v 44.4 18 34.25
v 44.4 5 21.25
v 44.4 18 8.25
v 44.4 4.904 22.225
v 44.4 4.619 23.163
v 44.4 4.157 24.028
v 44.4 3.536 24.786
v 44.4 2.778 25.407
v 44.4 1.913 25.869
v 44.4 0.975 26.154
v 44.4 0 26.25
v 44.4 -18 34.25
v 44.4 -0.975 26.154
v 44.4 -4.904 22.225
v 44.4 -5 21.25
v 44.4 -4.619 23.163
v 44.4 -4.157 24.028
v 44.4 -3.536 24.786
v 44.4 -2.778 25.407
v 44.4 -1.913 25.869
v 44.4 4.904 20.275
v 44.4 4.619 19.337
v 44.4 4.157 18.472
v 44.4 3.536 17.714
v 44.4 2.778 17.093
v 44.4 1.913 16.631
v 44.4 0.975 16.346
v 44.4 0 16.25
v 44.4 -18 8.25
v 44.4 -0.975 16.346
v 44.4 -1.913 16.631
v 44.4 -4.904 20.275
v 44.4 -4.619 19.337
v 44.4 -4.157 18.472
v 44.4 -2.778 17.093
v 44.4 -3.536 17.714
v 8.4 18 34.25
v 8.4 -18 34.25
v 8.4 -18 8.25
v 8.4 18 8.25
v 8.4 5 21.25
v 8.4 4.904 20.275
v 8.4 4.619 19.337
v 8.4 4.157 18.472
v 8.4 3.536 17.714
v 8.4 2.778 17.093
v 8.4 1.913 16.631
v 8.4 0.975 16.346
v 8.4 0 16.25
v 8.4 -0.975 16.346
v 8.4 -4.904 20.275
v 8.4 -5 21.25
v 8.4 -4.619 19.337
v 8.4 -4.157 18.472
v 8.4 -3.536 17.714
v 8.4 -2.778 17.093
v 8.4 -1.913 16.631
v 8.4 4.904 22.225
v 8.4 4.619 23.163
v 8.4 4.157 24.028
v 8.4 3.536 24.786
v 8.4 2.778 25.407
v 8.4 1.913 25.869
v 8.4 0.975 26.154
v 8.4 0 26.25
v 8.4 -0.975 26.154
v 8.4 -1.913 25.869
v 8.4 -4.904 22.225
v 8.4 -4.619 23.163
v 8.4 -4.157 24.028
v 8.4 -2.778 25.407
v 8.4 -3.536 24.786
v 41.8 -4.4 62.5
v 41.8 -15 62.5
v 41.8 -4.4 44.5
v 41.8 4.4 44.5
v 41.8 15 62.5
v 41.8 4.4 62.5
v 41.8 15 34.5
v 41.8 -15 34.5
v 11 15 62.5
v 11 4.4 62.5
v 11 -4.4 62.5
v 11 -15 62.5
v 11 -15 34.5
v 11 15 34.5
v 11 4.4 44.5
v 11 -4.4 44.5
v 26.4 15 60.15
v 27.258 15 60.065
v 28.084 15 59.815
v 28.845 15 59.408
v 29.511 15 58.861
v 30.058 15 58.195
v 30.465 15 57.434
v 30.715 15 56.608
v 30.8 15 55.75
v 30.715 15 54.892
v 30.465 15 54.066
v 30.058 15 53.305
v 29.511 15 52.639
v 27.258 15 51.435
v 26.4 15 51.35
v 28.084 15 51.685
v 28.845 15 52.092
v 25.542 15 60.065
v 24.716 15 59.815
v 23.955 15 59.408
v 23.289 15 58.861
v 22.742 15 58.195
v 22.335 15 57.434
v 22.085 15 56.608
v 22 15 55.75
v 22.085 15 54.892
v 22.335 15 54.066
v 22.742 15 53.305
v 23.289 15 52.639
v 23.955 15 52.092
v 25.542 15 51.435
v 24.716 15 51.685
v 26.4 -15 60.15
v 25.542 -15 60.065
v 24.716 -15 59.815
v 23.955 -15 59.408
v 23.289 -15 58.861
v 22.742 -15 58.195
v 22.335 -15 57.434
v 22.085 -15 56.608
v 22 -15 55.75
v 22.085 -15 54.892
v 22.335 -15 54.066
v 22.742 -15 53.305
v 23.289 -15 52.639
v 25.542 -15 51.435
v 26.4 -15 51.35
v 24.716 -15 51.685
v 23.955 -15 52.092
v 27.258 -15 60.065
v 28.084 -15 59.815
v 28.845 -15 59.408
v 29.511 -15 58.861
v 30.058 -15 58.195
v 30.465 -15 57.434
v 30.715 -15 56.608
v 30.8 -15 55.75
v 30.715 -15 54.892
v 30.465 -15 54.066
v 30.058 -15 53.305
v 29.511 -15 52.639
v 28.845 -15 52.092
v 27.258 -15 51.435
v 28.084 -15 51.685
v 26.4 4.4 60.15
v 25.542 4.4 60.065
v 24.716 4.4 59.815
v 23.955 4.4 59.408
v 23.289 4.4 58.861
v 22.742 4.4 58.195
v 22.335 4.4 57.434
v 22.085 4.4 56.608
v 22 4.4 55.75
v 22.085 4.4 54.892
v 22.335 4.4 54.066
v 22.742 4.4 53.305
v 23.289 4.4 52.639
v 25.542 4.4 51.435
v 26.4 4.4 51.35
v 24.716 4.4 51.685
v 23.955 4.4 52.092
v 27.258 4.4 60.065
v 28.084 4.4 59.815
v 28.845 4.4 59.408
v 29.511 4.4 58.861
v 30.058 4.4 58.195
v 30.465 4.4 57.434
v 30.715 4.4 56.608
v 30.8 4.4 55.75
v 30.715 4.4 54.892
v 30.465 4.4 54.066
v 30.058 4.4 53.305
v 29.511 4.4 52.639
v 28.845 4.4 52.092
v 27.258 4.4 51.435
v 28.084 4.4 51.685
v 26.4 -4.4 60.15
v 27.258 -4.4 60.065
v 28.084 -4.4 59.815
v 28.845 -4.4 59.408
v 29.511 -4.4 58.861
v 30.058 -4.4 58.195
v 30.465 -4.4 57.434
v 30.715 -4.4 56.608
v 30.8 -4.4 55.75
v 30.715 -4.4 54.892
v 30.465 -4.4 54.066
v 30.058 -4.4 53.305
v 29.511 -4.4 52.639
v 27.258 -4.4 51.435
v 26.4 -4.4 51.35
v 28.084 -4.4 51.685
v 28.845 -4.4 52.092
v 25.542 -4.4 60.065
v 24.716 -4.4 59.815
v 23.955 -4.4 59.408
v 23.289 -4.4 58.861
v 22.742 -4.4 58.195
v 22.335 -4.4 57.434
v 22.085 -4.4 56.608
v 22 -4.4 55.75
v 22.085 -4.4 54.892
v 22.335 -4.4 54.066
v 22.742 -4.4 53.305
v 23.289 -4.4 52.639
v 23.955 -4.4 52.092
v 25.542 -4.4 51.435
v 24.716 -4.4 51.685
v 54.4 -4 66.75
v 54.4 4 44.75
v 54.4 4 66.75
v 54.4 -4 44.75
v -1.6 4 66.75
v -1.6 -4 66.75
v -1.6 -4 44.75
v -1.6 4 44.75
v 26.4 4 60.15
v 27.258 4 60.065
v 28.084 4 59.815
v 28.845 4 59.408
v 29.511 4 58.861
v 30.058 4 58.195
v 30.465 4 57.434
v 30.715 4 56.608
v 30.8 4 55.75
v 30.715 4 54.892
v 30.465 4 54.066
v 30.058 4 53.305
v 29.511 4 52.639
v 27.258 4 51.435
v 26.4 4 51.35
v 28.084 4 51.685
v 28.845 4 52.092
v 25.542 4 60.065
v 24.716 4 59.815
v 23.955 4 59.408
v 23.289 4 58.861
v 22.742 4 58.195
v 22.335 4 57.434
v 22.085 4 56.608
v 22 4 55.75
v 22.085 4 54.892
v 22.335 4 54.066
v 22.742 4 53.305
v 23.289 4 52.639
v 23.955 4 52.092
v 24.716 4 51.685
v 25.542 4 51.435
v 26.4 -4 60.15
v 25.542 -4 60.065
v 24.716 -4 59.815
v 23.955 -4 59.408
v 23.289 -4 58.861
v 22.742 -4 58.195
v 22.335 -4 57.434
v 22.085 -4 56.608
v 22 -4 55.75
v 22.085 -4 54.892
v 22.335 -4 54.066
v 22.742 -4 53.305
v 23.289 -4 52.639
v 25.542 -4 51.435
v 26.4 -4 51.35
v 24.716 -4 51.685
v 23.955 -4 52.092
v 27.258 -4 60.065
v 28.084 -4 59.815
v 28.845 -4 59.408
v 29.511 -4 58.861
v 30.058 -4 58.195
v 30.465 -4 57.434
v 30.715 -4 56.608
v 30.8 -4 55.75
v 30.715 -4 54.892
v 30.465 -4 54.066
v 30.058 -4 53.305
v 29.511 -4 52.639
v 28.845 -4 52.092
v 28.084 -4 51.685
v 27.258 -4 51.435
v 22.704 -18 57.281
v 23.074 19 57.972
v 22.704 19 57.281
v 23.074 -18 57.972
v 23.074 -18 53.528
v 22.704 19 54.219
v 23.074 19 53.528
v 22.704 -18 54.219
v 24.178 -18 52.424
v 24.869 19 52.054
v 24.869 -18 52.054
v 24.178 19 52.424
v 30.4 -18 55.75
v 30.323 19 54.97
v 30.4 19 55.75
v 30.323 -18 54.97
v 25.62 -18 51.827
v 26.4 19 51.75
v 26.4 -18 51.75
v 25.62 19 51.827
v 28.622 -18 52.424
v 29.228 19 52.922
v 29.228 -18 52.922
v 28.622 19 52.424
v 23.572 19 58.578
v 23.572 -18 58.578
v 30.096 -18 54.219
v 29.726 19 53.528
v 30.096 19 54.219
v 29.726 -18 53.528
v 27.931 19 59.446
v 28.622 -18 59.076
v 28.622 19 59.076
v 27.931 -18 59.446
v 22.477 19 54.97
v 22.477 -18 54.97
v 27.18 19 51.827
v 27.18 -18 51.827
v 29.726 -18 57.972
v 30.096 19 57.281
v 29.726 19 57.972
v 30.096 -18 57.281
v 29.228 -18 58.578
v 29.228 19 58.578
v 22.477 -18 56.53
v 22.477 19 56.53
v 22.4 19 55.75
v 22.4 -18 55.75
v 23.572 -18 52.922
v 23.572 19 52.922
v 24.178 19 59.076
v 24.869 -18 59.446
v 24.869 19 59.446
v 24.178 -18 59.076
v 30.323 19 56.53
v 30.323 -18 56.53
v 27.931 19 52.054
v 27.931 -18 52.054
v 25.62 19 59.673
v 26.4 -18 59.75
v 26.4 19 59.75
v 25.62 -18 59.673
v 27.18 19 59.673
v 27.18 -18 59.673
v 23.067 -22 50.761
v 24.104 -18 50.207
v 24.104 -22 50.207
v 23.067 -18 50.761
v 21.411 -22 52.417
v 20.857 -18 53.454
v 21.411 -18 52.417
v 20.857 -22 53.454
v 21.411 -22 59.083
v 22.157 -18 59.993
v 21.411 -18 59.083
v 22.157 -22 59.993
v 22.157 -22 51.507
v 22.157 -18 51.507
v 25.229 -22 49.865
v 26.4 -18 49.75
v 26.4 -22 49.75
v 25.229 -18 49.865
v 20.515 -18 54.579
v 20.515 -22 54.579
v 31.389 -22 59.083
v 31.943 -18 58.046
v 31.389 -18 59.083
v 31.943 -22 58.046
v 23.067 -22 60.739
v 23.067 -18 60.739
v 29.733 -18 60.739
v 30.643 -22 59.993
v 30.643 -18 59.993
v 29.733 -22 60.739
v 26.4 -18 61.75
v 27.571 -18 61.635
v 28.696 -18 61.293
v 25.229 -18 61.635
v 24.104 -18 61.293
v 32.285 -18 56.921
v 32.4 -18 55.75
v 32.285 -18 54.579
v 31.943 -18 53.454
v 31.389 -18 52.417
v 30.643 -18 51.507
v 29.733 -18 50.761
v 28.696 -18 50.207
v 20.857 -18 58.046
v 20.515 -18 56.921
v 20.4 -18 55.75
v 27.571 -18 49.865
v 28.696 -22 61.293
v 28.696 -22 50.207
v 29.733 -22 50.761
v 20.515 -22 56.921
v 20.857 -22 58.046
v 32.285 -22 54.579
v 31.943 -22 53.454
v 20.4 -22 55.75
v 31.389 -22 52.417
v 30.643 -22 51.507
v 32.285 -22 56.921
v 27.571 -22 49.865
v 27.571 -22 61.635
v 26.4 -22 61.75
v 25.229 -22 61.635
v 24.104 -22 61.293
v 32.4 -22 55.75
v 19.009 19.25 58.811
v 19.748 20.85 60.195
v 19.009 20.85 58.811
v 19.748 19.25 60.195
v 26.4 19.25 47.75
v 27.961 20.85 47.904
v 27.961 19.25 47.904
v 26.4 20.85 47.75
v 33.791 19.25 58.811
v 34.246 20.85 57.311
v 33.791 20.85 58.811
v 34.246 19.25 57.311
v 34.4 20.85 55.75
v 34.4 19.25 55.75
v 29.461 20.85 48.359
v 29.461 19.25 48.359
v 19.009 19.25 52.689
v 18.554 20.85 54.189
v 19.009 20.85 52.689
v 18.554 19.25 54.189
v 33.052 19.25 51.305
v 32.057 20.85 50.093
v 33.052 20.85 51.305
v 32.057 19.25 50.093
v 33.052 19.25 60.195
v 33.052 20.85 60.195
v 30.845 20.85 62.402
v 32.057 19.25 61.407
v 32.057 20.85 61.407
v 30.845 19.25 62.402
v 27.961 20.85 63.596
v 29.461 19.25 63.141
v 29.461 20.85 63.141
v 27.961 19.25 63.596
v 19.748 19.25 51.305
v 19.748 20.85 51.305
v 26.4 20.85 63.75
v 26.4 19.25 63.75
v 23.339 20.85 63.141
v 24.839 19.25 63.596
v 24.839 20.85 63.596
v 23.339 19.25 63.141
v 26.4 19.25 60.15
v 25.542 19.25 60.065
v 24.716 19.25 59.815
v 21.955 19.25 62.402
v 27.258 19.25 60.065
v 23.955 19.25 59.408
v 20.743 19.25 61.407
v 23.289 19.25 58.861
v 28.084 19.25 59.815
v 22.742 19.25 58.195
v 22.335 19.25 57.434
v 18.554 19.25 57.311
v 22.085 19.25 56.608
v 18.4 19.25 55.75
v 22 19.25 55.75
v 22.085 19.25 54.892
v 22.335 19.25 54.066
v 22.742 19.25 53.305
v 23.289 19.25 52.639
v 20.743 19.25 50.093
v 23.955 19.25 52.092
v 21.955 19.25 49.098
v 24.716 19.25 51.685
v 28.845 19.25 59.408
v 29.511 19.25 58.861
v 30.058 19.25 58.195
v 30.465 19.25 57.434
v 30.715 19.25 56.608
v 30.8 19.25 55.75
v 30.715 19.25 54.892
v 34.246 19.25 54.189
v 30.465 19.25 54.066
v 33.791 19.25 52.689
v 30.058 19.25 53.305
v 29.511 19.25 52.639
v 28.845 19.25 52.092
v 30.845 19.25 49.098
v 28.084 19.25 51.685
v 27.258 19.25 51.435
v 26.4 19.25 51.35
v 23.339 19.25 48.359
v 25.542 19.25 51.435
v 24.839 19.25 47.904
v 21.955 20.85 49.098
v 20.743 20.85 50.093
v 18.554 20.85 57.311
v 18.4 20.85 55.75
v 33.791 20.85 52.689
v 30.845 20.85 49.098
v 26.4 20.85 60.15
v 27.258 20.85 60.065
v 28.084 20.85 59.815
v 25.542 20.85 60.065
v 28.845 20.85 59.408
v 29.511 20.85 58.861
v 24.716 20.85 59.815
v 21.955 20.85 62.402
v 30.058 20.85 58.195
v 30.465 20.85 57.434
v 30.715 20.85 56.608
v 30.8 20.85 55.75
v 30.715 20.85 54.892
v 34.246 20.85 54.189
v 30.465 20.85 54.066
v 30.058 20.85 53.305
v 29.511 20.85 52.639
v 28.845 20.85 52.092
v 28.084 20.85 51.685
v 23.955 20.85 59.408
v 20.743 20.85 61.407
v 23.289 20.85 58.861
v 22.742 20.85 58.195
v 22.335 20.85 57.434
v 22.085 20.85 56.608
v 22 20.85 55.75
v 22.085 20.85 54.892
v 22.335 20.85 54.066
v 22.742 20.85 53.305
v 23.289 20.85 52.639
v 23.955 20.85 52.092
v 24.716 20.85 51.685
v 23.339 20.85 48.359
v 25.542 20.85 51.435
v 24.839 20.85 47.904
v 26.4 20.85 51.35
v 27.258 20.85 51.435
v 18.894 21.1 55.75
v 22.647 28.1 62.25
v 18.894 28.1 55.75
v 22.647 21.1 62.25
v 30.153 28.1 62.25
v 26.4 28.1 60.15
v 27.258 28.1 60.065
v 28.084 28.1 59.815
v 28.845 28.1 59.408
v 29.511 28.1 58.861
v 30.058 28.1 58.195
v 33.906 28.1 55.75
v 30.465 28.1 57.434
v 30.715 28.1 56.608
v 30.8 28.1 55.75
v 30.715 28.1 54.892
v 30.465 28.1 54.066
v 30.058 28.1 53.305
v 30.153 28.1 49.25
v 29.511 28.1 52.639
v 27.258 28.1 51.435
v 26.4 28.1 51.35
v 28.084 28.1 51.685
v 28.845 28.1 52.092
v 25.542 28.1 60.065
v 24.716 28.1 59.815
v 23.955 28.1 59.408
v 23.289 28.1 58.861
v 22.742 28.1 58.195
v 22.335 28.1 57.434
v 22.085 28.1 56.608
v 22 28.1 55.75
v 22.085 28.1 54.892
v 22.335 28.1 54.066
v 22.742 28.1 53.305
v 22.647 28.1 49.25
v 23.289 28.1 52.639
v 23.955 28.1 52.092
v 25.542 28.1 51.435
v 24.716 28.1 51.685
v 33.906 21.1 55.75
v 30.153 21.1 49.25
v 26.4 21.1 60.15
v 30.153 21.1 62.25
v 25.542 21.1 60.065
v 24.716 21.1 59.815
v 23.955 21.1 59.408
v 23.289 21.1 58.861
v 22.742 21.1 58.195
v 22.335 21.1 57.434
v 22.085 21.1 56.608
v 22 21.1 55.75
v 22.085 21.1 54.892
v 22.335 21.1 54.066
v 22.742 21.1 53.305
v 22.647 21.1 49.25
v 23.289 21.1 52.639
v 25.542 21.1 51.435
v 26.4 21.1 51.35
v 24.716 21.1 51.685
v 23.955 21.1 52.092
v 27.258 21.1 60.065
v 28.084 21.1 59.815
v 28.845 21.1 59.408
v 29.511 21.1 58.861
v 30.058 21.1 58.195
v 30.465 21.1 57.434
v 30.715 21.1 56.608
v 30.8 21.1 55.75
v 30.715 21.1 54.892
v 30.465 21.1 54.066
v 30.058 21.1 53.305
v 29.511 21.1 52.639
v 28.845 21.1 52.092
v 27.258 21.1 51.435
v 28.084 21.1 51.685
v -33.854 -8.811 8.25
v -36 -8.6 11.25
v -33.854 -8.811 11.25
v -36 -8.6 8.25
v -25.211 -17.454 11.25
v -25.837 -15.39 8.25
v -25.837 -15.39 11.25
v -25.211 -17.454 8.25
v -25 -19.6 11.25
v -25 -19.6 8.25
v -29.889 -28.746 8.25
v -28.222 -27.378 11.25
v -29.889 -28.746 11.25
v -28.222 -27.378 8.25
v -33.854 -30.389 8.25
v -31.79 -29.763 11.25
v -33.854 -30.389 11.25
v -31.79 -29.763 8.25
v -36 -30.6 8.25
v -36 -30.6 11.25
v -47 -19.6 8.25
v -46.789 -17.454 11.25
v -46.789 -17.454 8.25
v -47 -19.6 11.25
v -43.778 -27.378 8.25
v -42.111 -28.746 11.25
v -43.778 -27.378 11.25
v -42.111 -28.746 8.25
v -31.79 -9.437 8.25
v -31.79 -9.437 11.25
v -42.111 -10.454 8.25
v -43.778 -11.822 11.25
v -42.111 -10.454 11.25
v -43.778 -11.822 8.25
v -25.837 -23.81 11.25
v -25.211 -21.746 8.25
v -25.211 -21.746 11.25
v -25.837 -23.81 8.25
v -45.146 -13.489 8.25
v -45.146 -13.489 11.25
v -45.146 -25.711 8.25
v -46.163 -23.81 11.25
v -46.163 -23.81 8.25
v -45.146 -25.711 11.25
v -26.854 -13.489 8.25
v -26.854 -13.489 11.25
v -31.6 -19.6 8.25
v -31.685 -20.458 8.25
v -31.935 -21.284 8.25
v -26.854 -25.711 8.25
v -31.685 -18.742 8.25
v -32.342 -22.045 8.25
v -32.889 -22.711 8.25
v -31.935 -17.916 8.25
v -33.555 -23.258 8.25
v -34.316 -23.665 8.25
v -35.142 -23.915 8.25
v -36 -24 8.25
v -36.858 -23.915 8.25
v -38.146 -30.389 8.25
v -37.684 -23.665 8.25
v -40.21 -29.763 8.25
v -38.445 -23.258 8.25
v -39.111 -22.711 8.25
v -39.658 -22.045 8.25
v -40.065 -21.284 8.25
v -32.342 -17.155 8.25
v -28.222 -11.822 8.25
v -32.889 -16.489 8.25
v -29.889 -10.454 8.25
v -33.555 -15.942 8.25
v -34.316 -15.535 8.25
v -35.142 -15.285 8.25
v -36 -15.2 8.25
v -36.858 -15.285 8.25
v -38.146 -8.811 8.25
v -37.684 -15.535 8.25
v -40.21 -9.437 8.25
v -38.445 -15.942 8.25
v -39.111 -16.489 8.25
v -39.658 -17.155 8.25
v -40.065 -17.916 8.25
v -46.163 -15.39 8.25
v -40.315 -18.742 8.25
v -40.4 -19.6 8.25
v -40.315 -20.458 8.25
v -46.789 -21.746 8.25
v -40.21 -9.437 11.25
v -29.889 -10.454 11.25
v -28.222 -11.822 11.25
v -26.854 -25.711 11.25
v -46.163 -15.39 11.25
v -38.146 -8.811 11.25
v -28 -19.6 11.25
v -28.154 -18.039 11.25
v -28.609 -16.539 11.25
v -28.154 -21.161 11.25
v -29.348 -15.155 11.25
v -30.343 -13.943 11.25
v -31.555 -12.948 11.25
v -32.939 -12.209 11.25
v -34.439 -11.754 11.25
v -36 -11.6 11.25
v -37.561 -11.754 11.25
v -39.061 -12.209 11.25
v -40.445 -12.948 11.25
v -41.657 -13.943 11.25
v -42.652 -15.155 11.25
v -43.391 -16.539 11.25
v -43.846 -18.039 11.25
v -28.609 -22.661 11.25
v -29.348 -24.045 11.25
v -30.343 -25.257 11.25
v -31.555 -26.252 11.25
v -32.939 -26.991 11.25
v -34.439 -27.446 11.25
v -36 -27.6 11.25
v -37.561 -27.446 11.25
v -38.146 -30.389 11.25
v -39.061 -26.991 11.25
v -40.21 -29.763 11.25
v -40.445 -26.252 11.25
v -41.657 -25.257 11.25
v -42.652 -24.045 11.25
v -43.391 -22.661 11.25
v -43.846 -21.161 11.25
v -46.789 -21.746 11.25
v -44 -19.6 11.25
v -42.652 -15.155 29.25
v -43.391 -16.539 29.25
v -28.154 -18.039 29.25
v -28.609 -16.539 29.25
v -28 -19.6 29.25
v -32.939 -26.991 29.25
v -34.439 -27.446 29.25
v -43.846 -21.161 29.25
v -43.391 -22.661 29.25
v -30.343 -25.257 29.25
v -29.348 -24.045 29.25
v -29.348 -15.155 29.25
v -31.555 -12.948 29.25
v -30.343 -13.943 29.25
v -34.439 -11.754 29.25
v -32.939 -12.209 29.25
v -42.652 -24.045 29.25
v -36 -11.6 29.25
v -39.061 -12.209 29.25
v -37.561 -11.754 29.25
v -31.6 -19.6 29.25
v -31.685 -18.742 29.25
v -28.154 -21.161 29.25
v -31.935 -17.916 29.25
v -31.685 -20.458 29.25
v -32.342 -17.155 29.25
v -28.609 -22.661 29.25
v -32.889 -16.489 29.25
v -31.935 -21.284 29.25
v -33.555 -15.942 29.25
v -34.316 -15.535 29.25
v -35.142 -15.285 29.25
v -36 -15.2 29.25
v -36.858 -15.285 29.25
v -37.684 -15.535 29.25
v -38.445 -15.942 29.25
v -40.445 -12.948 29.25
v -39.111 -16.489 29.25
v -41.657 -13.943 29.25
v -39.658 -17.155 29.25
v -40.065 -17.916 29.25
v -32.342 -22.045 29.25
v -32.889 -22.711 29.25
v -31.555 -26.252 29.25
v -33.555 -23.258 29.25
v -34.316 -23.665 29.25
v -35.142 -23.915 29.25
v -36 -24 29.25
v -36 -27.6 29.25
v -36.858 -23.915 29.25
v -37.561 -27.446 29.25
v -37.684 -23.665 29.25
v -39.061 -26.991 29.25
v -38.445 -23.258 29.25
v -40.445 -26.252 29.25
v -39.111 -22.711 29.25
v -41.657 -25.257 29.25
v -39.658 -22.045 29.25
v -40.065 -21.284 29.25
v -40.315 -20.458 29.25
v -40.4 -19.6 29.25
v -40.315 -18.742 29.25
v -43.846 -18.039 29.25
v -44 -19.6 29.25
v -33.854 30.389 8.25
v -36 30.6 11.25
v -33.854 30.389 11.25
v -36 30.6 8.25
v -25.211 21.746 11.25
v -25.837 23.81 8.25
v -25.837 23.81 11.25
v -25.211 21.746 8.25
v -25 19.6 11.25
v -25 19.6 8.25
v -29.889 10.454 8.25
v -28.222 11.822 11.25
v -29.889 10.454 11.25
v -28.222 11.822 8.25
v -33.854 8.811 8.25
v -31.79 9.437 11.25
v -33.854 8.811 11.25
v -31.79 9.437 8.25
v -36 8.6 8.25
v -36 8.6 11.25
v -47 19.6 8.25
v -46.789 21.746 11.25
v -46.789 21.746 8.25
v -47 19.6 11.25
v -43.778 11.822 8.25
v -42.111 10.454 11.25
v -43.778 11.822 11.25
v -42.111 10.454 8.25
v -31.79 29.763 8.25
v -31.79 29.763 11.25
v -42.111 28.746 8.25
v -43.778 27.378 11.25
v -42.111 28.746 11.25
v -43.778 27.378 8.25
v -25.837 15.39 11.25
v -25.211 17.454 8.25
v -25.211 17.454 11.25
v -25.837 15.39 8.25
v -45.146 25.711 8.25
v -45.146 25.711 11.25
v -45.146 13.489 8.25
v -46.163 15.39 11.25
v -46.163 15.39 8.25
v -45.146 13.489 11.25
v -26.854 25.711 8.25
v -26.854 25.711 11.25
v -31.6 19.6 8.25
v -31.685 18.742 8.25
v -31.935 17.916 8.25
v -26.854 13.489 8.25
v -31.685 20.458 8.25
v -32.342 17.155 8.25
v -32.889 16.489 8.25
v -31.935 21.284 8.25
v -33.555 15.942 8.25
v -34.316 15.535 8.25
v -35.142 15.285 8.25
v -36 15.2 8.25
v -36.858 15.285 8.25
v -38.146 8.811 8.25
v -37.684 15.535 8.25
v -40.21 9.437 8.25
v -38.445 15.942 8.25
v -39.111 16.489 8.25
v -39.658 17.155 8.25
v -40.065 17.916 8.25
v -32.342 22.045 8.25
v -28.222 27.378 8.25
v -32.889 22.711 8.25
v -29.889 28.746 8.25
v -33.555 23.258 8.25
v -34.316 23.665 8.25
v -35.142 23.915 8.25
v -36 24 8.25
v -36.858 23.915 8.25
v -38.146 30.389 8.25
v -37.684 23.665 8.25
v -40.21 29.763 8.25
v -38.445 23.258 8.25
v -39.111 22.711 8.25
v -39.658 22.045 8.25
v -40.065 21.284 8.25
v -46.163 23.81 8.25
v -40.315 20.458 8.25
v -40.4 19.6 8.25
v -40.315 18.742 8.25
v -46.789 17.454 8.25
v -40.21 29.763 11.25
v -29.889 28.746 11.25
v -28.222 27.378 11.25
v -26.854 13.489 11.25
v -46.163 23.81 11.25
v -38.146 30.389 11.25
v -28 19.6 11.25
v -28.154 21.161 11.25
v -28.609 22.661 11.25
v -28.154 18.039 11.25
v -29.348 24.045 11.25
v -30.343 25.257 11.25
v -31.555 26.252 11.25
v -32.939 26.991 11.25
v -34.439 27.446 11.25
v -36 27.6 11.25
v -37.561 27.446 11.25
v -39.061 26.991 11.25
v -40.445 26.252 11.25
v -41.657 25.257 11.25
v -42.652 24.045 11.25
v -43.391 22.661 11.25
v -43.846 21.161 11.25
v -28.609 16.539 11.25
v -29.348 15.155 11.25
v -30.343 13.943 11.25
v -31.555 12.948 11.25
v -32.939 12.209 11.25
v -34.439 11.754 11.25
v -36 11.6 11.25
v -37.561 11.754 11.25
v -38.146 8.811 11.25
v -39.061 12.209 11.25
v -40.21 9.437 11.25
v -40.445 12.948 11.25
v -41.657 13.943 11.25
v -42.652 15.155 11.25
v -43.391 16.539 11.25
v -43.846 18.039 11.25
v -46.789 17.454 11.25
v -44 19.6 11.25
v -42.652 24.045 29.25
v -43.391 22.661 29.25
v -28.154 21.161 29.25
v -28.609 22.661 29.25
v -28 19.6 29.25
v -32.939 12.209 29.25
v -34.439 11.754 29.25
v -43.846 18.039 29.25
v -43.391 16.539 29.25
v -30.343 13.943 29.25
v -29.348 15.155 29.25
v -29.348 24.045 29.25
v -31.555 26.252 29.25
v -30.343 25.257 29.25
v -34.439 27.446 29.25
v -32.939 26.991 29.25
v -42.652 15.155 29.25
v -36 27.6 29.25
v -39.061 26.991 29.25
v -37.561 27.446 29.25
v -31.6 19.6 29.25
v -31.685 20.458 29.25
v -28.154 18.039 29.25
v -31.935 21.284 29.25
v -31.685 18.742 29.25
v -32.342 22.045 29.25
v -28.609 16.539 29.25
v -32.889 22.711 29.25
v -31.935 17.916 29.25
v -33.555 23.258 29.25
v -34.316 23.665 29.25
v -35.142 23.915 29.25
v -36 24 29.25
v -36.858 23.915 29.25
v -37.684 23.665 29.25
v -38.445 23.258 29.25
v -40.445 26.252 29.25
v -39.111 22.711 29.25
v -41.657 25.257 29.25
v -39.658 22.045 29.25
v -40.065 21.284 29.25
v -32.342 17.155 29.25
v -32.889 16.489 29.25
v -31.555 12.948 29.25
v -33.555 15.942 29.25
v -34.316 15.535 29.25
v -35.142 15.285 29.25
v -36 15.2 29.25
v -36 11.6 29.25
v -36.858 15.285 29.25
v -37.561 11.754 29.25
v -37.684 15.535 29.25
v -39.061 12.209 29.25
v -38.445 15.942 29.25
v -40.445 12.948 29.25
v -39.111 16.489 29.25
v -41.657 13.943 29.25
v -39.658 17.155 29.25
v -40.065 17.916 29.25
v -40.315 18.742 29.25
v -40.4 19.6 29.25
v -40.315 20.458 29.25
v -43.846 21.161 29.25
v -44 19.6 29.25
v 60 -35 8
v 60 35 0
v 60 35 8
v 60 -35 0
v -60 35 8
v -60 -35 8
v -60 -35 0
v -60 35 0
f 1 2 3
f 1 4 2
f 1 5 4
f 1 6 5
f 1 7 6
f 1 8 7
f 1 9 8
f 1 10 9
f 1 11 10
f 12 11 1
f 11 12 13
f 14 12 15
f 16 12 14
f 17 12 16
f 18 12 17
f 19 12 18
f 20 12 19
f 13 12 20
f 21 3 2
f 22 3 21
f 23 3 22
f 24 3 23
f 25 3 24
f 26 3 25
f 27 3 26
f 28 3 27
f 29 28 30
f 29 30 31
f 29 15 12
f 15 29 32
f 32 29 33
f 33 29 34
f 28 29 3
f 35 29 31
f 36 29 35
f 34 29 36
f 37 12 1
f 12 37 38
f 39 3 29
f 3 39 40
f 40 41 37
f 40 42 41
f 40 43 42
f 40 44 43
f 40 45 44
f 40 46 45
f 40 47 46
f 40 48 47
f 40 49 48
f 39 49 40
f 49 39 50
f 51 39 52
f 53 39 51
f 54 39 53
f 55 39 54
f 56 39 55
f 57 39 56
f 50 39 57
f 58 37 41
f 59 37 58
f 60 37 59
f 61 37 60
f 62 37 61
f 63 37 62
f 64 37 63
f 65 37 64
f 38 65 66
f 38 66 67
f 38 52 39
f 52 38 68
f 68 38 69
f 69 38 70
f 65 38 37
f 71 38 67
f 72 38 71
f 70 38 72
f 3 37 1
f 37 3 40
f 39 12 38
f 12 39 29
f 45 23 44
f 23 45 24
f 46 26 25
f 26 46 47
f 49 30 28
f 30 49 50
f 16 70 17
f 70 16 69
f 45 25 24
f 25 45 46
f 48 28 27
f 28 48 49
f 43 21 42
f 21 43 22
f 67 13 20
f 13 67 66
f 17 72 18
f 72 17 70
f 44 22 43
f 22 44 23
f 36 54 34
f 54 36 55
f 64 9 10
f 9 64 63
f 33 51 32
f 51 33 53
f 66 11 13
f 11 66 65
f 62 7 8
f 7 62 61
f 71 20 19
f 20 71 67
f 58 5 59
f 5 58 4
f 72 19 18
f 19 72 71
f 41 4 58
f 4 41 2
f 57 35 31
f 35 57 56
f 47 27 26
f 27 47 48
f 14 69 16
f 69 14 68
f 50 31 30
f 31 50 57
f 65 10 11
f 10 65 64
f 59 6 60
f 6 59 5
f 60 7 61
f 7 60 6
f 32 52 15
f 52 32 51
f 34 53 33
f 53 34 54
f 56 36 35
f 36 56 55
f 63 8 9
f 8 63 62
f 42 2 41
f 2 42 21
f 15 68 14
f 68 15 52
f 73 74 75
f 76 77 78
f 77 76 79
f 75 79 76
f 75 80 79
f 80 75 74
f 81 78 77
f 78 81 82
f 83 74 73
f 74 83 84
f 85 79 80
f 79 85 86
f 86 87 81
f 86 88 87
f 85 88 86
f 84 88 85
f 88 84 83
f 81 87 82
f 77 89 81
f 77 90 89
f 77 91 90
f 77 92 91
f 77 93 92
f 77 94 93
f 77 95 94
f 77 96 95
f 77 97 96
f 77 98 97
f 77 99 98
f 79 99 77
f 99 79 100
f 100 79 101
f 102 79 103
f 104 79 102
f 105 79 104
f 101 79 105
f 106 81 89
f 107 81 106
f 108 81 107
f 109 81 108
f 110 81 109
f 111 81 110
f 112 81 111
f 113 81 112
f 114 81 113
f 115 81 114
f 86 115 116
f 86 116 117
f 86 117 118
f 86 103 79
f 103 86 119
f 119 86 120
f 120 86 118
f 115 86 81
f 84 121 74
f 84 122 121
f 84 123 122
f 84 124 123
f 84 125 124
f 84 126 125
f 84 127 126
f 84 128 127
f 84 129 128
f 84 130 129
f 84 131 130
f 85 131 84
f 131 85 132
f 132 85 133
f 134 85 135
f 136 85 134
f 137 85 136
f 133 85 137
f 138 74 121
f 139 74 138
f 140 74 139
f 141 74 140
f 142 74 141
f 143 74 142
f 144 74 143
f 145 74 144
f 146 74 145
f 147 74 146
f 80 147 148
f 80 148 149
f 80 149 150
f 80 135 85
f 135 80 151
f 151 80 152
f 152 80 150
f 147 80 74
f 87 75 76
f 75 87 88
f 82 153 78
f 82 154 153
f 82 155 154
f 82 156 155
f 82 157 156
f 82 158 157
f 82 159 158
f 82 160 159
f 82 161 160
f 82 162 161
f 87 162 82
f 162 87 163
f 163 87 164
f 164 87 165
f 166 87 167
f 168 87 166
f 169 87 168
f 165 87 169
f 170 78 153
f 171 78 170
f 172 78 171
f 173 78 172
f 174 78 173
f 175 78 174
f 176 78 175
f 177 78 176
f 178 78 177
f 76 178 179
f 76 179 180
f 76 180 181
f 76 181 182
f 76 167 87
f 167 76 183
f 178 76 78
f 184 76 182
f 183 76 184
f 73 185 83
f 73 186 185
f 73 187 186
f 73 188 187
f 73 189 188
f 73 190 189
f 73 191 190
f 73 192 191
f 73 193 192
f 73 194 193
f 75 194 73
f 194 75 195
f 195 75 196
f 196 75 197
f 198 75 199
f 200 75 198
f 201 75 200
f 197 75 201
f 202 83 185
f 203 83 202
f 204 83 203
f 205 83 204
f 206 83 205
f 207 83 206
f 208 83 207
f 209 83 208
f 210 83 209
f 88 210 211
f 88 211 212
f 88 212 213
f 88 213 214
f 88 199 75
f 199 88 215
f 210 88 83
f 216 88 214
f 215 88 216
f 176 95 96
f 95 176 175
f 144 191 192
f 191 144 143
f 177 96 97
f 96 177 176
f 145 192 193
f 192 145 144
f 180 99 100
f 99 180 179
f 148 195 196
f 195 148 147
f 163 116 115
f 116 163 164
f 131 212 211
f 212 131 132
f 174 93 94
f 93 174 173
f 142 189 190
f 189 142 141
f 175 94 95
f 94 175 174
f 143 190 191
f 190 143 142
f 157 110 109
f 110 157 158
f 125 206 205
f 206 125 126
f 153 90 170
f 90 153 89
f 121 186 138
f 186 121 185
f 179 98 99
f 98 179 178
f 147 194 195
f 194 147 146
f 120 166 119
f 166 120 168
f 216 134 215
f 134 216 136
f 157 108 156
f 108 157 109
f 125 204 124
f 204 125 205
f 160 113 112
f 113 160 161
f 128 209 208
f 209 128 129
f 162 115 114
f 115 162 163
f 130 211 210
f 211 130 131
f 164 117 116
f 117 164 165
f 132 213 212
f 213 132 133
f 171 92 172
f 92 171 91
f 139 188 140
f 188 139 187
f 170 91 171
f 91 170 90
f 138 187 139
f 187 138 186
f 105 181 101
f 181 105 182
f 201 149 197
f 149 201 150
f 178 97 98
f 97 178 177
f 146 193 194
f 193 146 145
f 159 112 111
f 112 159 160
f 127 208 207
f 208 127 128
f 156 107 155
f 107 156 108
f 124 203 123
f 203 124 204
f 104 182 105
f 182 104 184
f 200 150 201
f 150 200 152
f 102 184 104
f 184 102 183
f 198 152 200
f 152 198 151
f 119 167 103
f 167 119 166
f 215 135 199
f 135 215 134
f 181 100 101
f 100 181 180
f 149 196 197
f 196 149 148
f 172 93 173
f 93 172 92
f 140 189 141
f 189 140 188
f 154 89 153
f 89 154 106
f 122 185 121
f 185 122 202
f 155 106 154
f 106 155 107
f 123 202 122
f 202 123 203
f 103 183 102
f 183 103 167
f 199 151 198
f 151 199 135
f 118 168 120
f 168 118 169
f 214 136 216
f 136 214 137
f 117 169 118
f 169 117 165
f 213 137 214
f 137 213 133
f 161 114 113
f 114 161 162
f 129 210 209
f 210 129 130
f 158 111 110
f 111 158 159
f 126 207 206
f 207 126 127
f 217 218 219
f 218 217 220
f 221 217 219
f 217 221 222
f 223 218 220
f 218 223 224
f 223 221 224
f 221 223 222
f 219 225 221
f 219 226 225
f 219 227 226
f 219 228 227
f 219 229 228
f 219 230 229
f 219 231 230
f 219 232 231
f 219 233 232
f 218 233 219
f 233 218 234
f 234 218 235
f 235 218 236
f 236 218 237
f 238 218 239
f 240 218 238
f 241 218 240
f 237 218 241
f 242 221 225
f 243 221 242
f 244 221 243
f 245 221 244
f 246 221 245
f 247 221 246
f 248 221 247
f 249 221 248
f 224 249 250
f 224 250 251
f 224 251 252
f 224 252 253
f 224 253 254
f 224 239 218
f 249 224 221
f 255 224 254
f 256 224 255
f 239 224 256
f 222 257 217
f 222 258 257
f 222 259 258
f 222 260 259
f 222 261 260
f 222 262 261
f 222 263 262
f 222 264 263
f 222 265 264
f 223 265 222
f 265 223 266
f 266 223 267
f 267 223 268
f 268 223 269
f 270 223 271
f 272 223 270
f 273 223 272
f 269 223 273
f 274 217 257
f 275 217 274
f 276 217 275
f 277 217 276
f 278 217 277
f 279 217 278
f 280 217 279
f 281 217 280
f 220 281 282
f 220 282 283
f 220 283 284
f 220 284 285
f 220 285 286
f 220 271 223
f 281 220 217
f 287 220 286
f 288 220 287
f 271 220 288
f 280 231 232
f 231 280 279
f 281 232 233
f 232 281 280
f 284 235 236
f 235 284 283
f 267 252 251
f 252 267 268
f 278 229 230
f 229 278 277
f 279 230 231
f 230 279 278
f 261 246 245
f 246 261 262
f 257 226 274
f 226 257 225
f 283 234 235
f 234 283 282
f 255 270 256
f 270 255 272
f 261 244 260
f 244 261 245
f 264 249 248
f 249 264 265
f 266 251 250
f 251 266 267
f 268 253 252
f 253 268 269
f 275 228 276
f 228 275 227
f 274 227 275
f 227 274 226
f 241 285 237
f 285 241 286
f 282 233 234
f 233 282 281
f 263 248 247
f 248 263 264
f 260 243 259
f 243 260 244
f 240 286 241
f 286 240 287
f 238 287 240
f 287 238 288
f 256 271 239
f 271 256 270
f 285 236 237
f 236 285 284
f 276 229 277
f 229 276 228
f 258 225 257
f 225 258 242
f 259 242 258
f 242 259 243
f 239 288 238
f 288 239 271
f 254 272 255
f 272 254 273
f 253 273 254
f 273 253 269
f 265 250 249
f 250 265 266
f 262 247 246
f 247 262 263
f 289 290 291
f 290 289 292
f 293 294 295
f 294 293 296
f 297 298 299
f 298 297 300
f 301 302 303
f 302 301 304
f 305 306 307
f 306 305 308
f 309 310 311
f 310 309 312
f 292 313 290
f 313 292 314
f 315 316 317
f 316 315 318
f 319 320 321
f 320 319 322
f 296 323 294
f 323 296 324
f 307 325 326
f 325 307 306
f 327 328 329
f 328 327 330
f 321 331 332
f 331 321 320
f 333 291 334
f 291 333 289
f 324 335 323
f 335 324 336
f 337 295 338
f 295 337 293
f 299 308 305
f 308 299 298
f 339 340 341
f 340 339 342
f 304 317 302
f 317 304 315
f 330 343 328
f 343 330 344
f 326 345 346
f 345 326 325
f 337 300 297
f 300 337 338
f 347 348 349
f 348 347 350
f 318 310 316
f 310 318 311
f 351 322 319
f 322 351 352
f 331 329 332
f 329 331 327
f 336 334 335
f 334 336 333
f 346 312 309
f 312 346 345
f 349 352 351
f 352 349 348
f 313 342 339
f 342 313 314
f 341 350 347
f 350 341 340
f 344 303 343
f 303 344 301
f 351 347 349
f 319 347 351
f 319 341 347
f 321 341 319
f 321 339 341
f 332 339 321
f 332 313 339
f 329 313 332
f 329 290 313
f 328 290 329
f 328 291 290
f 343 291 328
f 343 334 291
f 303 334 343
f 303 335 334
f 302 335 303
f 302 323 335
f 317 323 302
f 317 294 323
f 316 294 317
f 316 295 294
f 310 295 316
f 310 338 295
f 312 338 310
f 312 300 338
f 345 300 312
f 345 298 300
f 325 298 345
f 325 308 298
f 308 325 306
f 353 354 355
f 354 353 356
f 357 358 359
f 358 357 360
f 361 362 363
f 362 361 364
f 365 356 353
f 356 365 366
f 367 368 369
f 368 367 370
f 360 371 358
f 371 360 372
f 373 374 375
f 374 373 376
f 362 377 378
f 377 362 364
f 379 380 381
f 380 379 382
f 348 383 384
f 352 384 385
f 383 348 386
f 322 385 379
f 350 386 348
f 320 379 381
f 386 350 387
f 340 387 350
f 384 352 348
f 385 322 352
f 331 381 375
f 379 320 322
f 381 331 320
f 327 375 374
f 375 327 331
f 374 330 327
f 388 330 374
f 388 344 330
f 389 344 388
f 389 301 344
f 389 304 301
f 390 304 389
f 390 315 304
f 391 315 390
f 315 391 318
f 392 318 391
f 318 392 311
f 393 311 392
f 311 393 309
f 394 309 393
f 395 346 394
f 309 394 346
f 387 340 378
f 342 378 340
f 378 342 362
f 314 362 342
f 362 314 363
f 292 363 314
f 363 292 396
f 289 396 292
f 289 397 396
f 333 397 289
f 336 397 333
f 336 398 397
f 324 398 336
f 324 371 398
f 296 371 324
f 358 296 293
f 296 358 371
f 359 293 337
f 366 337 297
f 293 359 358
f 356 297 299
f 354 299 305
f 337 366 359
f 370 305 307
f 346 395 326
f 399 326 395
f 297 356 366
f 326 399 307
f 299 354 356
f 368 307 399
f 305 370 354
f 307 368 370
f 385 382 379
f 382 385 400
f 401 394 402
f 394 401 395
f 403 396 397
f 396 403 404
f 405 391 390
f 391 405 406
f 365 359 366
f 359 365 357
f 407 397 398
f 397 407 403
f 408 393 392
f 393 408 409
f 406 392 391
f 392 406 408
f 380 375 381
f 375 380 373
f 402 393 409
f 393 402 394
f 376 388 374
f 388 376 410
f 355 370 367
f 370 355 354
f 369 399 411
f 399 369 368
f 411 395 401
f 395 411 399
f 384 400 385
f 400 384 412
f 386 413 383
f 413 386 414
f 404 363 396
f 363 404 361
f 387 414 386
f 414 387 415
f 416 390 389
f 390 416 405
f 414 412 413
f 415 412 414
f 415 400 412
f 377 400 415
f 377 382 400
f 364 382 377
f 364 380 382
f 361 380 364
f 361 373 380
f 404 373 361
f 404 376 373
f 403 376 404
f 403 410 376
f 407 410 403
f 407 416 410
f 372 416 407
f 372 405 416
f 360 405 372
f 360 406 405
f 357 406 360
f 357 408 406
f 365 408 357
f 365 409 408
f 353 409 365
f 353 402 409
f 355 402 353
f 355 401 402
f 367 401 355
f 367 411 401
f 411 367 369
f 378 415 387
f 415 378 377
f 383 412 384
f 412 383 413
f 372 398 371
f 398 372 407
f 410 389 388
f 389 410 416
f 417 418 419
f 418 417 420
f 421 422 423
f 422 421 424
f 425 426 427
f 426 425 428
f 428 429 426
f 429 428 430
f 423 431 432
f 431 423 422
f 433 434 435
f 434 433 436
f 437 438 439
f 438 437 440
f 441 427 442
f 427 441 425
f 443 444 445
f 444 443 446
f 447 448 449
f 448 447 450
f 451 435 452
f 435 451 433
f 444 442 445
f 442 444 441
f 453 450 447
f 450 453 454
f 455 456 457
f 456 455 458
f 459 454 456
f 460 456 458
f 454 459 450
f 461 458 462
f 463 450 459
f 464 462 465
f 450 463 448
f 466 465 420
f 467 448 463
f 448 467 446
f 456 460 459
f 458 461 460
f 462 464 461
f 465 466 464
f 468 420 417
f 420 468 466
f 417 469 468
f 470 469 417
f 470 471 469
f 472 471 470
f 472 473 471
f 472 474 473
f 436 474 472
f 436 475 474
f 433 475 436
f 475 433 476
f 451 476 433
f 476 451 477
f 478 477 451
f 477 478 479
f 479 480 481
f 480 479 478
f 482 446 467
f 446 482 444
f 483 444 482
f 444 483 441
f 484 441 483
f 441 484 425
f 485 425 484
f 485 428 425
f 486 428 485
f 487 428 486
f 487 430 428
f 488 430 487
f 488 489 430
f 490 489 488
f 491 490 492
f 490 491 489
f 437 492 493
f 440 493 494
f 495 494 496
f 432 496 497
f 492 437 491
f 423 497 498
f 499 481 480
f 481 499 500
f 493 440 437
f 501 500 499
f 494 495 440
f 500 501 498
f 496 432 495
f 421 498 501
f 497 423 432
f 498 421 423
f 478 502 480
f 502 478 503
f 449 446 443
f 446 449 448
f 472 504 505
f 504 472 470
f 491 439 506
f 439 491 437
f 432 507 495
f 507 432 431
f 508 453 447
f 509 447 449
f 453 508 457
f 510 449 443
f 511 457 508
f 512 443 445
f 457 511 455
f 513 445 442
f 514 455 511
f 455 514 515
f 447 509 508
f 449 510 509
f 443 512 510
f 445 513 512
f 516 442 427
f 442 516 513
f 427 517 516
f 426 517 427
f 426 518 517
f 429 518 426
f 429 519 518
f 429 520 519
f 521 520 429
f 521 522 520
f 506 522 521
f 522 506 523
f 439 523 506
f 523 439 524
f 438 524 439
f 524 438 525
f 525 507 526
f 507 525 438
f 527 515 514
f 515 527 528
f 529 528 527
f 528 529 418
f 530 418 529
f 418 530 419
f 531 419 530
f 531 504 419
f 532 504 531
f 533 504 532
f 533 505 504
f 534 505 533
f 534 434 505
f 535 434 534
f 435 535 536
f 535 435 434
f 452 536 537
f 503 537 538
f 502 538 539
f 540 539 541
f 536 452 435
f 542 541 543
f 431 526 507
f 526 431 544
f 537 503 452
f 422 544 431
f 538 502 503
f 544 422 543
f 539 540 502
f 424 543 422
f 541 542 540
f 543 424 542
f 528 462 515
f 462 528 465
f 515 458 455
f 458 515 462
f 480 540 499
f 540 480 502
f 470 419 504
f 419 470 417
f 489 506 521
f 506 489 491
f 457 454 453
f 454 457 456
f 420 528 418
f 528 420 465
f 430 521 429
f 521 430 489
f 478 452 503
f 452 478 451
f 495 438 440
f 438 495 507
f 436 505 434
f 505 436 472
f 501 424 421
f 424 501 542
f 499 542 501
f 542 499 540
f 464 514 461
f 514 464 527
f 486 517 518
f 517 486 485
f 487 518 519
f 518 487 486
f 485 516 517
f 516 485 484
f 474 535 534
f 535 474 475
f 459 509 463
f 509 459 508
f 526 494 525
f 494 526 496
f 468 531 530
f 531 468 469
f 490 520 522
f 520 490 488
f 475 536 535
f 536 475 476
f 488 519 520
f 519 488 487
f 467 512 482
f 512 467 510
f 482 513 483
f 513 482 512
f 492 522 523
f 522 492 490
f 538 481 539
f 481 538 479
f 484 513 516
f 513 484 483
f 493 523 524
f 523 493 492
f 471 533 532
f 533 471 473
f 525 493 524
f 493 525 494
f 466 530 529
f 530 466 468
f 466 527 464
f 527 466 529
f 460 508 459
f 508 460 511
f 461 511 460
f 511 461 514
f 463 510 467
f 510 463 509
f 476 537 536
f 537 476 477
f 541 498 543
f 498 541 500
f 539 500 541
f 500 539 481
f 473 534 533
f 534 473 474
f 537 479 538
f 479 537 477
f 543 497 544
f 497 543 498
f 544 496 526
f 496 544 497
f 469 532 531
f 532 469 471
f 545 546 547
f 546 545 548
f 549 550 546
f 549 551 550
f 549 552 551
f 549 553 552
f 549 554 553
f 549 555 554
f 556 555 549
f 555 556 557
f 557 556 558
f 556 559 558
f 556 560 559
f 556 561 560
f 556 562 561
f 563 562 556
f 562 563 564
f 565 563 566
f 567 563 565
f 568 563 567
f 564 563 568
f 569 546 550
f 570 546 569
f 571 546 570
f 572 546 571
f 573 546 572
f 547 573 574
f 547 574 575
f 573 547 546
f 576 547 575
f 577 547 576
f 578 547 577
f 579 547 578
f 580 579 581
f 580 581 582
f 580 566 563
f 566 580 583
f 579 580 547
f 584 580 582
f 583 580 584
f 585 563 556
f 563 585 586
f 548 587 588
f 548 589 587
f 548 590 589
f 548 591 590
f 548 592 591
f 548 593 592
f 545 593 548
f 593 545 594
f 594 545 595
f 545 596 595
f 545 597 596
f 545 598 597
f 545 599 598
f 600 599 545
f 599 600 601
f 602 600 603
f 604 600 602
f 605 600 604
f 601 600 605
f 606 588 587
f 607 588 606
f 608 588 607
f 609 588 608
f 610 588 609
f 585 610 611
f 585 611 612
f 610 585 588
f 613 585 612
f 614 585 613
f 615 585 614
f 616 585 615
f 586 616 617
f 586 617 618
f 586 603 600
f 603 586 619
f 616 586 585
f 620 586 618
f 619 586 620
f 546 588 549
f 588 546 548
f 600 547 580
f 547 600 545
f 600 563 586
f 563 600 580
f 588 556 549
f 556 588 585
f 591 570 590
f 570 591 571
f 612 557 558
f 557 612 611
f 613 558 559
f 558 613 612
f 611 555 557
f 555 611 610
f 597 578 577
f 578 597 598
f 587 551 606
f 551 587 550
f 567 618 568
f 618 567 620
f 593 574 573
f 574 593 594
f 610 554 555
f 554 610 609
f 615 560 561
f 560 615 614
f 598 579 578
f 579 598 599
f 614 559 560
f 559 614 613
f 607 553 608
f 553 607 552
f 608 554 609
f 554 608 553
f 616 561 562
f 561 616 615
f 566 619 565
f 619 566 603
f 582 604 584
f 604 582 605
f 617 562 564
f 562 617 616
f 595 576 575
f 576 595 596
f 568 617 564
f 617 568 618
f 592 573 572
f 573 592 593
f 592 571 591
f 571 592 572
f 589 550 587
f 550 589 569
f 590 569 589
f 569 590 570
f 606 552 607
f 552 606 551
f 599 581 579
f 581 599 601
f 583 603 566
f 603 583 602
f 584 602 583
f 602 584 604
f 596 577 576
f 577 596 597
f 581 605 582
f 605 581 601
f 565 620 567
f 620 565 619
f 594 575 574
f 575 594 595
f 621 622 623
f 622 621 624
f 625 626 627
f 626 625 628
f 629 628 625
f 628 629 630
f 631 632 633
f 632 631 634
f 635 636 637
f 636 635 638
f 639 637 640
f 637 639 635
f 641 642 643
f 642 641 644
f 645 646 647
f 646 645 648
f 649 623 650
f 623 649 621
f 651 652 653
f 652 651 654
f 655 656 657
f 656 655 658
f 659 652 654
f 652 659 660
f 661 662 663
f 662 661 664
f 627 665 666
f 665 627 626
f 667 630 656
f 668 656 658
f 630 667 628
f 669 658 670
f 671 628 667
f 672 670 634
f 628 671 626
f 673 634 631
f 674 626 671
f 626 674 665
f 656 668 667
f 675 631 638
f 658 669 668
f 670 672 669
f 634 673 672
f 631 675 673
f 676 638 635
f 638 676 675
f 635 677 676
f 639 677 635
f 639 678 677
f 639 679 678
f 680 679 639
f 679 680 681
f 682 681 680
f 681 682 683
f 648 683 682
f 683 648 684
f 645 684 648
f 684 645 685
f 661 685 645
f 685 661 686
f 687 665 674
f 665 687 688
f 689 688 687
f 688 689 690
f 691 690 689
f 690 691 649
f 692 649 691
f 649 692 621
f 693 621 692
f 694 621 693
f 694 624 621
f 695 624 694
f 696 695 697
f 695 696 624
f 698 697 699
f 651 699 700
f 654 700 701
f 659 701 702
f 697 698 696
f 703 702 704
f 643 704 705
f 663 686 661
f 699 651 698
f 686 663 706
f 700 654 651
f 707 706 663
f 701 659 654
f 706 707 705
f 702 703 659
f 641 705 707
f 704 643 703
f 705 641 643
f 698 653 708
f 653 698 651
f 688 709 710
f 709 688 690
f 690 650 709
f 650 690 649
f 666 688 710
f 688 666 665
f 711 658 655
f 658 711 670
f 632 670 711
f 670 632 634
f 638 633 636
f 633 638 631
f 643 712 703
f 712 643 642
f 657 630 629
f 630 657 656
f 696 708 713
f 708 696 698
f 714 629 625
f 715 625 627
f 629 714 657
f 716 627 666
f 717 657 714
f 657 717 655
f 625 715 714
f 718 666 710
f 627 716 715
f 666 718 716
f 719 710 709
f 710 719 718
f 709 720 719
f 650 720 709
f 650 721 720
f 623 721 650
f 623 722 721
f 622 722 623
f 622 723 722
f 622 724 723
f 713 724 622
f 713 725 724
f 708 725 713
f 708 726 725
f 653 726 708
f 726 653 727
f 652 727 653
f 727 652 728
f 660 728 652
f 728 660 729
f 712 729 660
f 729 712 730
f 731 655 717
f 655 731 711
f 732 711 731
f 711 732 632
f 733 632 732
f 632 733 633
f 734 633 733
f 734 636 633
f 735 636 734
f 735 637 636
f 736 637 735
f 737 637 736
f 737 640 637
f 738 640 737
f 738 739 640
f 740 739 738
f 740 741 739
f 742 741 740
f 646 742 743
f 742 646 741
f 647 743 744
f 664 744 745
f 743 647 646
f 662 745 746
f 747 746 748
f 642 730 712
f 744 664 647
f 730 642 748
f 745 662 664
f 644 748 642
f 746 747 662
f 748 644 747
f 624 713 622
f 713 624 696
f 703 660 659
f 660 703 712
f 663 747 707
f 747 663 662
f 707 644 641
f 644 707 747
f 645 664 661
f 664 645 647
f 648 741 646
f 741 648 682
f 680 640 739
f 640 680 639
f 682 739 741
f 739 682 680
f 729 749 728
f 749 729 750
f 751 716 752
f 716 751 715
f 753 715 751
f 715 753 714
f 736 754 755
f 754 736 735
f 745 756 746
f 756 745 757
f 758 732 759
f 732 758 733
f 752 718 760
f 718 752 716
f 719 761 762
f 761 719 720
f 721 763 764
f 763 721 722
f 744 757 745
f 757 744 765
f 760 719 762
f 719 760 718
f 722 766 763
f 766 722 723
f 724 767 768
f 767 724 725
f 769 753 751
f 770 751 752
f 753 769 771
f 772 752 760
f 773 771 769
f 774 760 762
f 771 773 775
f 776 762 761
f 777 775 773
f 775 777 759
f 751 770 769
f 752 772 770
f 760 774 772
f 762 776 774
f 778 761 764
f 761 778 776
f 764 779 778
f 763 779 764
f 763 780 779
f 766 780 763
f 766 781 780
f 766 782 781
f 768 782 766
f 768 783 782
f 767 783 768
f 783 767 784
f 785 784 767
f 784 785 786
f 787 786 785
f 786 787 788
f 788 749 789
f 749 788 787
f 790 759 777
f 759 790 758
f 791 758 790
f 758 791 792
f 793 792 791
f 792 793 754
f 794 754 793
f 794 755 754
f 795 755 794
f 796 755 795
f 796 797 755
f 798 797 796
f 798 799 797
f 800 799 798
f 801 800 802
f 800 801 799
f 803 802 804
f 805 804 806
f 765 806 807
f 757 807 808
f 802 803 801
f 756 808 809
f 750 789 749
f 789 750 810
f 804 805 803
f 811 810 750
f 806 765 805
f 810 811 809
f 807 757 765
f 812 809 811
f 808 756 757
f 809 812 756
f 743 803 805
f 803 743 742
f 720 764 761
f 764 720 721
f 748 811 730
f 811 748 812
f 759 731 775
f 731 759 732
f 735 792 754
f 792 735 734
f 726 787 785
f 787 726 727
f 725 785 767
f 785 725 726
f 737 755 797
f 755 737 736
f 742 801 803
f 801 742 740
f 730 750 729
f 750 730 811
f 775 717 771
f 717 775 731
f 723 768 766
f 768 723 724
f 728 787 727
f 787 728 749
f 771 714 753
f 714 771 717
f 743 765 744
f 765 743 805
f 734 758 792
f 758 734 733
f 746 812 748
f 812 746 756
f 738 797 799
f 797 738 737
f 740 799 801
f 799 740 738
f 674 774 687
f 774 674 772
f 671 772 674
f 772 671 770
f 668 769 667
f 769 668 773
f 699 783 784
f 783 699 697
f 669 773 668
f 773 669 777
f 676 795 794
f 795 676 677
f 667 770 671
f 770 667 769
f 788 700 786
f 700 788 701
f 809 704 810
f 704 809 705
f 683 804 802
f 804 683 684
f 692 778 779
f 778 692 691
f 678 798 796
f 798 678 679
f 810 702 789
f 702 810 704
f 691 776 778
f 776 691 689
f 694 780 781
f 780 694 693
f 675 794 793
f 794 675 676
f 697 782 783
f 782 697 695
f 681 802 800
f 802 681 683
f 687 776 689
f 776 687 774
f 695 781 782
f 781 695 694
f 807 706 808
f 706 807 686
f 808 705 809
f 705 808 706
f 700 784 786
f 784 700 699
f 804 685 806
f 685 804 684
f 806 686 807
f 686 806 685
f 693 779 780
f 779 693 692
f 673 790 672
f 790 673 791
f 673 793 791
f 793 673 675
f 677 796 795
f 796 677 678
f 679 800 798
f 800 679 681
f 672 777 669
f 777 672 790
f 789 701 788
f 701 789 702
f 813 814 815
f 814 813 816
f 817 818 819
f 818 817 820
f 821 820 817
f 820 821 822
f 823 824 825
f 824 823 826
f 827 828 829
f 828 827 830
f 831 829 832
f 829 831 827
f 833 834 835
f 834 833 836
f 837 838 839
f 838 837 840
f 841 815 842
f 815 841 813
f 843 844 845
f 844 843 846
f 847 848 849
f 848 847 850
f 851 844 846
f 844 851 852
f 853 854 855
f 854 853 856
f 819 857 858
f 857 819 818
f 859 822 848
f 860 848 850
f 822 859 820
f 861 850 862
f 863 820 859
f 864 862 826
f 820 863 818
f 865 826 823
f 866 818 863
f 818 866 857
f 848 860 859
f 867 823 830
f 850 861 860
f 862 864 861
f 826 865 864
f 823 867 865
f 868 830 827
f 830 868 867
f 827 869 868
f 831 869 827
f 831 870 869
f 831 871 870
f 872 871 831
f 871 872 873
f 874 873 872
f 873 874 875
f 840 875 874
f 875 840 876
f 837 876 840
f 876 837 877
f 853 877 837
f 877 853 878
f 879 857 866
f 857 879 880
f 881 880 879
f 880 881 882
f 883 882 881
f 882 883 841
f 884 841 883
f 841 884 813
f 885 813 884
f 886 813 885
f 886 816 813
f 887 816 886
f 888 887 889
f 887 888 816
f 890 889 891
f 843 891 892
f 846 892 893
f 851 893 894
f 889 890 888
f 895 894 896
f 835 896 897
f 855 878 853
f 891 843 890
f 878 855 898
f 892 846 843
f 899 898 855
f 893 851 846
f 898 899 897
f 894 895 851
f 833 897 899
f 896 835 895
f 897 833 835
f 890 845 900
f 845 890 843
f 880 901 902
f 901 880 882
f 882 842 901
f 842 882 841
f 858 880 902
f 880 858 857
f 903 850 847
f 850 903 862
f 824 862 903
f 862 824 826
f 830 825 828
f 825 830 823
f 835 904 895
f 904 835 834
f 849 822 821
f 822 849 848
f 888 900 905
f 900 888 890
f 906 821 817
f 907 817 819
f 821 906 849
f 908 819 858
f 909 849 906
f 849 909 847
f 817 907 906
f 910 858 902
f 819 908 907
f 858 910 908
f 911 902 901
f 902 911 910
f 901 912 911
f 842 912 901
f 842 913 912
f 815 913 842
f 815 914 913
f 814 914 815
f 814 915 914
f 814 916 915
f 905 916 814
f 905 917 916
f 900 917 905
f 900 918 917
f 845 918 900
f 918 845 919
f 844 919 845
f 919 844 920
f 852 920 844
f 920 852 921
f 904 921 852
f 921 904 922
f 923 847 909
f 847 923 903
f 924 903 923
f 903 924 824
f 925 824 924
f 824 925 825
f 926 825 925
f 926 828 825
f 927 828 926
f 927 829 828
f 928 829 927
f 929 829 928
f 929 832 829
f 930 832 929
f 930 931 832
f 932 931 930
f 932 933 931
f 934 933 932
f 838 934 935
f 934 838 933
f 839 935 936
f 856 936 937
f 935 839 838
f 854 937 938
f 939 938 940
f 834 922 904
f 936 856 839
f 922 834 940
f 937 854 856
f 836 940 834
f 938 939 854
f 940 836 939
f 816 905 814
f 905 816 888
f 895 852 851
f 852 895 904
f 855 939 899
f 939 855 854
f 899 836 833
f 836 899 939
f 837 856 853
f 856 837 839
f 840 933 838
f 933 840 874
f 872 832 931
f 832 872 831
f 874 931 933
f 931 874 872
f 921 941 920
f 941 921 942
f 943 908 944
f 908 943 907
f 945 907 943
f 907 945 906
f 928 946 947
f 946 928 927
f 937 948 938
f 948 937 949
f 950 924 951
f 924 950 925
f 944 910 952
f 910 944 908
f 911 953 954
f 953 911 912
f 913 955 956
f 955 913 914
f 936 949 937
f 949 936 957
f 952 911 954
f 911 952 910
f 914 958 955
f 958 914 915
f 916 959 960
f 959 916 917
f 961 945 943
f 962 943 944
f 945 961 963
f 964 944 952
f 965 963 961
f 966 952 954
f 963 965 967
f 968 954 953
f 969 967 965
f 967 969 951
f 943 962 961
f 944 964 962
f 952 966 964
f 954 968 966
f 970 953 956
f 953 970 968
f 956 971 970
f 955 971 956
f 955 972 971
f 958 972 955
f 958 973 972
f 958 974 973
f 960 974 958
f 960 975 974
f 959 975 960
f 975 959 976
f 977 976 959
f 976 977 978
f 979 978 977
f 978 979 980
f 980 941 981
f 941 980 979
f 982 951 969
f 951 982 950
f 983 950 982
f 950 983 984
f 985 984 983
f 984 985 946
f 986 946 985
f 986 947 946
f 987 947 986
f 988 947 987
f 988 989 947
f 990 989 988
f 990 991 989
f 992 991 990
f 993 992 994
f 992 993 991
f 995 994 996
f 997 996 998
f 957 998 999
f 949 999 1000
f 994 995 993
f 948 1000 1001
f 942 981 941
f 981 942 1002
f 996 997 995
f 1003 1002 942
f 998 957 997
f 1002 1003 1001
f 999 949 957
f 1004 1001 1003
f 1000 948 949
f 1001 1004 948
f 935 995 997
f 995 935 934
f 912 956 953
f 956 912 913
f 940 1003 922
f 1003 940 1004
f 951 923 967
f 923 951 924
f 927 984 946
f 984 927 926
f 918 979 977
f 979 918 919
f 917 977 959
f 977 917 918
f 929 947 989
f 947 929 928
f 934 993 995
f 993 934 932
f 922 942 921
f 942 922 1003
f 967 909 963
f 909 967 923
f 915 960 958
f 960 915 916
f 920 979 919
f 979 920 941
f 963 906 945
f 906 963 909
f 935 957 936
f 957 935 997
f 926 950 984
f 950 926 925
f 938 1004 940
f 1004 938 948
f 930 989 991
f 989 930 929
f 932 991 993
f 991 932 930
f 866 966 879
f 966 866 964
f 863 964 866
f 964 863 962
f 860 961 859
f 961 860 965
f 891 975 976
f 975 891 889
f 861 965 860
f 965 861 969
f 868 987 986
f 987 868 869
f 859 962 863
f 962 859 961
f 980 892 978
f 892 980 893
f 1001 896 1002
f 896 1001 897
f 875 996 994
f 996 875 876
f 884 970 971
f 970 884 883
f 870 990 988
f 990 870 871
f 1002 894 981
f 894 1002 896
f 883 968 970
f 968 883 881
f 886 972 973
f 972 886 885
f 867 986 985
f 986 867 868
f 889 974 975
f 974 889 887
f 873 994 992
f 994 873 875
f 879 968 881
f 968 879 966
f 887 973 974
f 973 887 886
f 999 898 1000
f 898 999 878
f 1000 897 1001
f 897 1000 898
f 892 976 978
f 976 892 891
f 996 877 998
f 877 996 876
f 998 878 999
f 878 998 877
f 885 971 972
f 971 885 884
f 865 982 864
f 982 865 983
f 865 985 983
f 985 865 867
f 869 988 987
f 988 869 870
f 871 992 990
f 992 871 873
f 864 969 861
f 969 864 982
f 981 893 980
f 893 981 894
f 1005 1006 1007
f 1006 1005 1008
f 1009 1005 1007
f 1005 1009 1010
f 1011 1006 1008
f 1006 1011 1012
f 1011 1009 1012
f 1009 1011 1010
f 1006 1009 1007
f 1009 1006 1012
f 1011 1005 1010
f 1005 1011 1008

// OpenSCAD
$fn = 32;

// ------------------------------------------------------------------------
// Indexing jig: plate 120 x 70 mm, pin d8
// Every part is its own module, assembly() places every instance.
// ------------------------------------------------------------------------

// --- part 1 ---
module jig_plate() {
  difference() {
    translate([-60, -35, 0]) cube([120, 70, 8]);
  }
}

// --- part 2 ---
module locator_block() {
  difference() {
    translate([-18, -18, 0]) cube([36, 36, 26]);
    translate([0, 0, 13]) rotate([0, 90, 0]) cylinder(h = 38, d = 10, center = true);
  }
}

// --- part 3 ---
module index_fork() {
  difference() {
    translate([-15.4, -15, 0]) cube([30.8, 30, 28]);
    translate([-16.4, -4.4, 10]) cube([32.8, 8.8, 19]);
    translate([0, 0, 21.25]) rotate([90, 0, 0]) cylinder(h = 32, d = 8.8, center = true);
  }
}

// --- part 4 ---
module index_arm() {
  difference() {
    translate([-28, -4, 0]) cube([56, 8, 22]);
    translate([0, 0, 11]) rotate([90, 0, 0]) cylinder(h = 10, d = 8.8, center = true);
  }
}

// --- part 5 ---
module index_pin() {
  rotate([0, 90, 0]) cylinder(h = 38, d = 8, center = true);
  translate([-22, 0, 0]) rotate([0, 90, 0]) cylinder(h = 4, d = 12);
}

// --- part 6 ---
module pin_washer() {
  difference() {
      translate([0, 0, 0]) cylinder(h = 1.6, d = 16);
      translate([0, 0, -1]) cylinder(h = 3.6, d = 8.8);
    }
}

// --- part 7 ---
module lock_nut() {
  difference() {
    linear_extrude(height = 7) polygon(points = [[7.506, 0], [3.753, 6.5], [-3.753, 6.5], [-7.506, 0], [-3.753, -6.5], [3.753, -6.5]]);
    translate([0, 0, -1]) cylinder(h = 9, d = 8.8);
  }
}

// --- part 8 ---
module guide_bush_a() {
  difference() {
    union() {
      cylinder(h = 3, d = 22);
      translate([0, 0, 3]) cylinder(h = 18, d = 16);
    }
    translate([0, 0, -1]) cylinder(h = 23, d = 8.8);
  }
}

// --- part 9 ---
module guide_bush_b() {
  difference() {
    union() {
      cylinder(h = 3, d = 22);
      translate([0, 0, 3]) cylinder(h = 18, d = 16);
    }
    translate([0, 0, -1]) cylinder(h = 23, d = 8.8);
  }
}

// --- assembly ---
module assembly() {
  color([0.80, 0.24, 0.20]) translate([0, 0, 0]) rotate([0, 0, 0]) jig_plate();
  color([0.20, 0.45, 0.75]) translate([26.4, 0, 8.25]) rotate([0, 0, 0]) locator_block();
  color([0.25, 0.62, 0.32]) translate([26.4, 0, 34.5]) rotate([0, 0, 0]) index_fork();
  color([0.92, 0.70, 0.18]) translate([26.4, 0, 44.75]) rotate([0, 0, 0]) index_arm();
  color([0.58, 0.35, 0.70]) translate([26.4, 0, 55.75]) rotate([0, 0, 90]) index_pin();
  color([0.16, 0.66, 0.66]) translate([26.4, 20.85, 55.75]) rotate([90, 0, 0]) pin_washer();
  color([0.85, 0.48, 0.18]) translate([26.4, 28.1, 55.75]) rotate([90, 0, 0]) lock_nut();
  color([0.55, 0.60, 0.65]) translate([-36, -19.6, 8.25]) rotate([0, 0, 0]) guide_bush_a();
  color([0.75, 0.30, 0.55]) translate([-36, 19.6, 8.25]) rotate([0, 0, 0]) guide_bush_b();
}

assembly();
